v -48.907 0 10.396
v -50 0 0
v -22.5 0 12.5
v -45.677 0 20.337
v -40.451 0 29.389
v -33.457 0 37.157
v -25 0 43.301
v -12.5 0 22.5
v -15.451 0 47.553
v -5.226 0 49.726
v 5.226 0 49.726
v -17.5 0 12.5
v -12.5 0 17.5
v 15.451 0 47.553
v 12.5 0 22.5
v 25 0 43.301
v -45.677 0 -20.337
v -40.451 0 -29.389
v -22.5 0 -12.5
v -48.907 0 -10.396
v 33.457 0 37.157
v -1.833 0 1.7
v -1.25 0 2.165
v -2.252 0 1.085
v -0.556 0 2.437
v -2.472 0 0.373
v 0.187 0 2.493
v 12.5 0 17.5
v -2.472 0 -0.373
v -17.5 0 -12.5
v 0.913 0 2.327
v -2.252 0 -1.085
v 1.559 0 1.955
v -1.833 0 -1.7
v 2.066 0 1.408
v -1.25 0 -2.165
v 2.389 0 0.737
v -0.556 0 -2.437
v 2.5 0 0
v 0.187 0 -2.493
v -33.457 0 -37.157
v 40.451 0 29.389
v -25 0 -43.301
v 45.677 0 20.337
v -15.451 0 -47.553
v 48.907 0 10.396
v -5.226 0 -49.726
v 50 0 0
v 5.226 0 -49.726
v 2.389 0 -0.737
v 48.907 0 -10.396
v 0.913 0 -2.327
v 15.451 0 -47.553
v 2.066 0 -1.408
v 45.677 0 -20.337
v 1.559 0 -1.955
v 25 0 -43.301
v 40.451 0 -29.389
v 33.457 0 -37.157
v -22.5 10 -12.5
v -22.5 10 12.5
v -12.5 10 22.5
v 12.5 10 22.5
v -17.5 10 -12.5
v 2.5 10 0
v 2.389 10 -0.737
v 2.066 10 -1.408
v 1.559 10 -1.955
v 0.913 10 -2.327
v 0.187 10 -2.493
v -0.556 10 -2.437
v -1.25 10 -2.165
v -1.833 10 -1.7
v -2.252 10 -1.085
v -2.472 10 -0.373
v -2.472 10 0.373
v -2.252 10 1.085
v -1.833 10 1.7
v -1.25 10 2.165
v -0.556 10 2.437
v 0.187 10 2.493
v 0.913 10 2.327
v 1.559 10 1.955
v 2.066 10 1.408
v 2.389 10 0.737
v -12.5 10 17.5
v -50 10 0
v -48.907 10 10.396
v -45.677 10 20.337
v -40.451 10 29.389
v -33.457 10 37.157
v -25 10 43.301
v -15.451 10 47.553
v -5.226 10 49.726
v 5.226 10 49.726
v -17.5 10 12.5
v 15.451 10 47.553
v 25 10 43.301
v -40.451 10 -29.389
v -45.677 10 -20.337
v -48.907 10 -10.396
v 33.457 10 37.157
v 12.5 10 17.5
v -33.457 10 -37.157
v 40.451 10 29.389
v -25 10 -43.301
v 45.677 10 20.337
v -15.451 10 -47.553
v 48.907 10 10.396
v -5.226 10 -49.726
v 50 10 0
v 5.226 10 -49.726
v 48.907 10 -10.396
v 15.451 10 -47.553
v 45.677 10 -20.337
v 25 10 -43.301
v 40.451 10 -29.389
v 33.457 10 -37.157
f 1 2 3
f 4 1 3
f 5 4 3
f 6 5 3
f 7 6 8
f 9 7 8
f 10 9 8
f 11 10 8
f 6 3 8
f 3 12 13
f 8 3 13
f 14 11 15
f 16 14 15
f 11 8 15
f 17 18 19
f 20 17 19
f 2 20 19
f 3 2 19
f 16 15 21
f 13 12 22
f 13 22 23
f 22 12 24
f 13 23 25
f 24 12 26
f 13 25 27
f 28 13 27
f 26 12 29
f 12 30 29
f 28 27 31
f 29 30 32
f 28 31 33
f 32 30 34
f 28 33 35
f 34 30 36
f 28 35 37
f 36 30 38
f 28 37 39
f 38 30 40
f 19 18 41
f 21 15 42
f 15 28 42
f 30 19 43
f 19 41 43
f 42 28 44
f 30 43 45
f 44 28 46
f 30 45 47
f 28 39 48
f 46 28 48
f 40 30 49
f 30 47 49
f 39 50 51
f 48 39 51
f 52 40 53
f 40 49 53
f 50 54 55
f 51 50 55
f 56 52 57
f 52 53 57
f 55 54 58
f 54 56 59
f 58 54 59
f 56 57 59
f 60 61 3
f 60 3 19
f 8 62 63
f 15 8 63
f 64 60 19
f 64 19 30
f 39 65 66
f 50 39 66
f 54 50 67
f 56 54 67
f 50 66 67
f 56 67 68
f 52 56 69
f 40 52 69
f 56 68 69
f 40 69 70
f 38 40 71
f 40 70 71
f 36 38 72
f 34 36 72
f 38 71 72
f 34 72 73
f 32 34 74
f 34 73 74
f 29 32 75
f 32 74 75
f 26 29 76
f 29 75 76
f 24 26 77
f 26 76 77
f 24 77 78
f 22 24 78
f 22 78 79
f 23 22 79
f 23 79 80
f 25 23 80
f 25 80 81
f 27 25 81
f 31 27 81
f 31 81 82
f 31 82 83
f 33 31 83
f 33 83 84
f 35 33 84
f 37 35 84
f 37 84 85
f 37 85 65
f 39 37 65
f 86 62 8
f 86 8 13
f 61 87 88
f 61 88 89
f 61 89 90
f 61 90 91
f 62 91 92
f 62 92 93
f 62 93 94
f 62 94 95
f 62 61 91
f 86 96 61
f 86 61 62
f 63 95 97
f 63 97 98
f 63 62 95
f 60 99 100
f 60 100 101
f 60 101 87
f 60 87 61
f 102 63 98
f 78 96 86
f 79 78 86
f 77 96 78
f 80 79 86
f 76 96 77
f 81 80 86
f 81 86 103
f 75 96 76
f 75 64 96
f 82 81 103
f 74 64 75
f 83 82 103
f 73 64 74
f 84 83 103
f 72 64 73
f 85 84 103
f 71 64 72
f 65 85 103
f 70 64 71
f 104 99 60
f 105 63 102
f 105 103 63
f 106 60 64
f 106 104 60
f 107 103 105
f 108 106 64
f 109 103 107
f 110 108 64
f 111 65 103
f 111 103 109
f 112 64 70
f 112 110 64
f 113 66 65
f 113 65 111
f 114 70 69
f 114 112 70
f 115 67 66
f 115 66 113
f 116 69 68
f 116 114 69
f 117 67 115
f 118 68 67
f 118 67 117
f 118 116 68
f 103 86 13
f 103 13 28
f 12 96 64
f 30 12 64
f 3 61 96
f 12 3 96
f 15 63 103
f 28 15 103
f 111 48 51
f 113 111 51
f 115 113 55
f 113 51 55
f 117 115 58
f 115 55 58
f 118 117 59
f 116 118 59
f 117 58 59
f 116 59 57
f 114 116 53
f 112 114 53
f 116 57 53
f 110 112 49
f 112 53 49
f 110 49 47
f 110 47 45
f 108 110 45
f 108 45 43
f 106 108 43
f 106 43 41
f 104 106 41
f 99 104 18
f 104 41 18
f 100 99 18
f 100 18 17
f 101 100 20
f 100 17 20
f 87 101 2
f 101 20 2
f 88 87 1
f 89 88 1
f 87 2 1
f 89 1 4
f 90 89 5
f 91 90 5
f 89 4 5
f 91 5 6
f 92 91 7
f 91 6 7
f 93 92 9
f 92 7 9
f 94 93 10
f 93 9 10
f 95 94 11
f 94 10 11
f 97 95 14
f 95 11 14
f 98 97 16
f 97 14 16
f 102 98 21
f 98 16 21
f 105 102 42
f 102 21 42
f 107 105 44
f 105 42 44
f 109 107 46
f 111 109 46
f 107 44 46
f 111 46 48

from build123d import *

# Parameters (mm, degrees)
SKETCH1_R           = 50
BOSS_EXTRUDE1_DEPTH = 10
SKETCH2_R           = 2.5
SKETCH2_W           = 5
SKETCH2_H           = 25
SKETCH2_W_2         = 25
SKETCH2_H_2         = 5
CUT_EXTRUDE1_DEPTH  = 11


with BuildPart() as part:
    # Sketch1 → Boss-Extrude1 (new body)
    with BuildSketch(Plane(origin=(0, 0, 0), x_dir=(1, 0, 0), z_dir=(0, 1, 0))):
        Circle(SKETCH1_R)
    extrude(amount=BOSS_EXTRUDE1_DEPTH)

    # Sketch2 → Cut-Extrude1 (cut, through all)
    with BuildSketch(Plane(origin=(0, 10, 0), x_dir=(1, 0, 0), z_dir=(0, 1, 0))):
        Circle(SKETCH2_R)
        with Locations((-20, 0)):
            Rectangle(SKETCH2_W, SKETCH2_H)
        with Locations((0, -20)):
            Rectangle(SKETCH2_W_2, SKETCH2_H_2)
    extrude(amount=-CUT_EXTRUDE1_DEPTH, mode=Mode.SUBTRACT)


solid = part.part
